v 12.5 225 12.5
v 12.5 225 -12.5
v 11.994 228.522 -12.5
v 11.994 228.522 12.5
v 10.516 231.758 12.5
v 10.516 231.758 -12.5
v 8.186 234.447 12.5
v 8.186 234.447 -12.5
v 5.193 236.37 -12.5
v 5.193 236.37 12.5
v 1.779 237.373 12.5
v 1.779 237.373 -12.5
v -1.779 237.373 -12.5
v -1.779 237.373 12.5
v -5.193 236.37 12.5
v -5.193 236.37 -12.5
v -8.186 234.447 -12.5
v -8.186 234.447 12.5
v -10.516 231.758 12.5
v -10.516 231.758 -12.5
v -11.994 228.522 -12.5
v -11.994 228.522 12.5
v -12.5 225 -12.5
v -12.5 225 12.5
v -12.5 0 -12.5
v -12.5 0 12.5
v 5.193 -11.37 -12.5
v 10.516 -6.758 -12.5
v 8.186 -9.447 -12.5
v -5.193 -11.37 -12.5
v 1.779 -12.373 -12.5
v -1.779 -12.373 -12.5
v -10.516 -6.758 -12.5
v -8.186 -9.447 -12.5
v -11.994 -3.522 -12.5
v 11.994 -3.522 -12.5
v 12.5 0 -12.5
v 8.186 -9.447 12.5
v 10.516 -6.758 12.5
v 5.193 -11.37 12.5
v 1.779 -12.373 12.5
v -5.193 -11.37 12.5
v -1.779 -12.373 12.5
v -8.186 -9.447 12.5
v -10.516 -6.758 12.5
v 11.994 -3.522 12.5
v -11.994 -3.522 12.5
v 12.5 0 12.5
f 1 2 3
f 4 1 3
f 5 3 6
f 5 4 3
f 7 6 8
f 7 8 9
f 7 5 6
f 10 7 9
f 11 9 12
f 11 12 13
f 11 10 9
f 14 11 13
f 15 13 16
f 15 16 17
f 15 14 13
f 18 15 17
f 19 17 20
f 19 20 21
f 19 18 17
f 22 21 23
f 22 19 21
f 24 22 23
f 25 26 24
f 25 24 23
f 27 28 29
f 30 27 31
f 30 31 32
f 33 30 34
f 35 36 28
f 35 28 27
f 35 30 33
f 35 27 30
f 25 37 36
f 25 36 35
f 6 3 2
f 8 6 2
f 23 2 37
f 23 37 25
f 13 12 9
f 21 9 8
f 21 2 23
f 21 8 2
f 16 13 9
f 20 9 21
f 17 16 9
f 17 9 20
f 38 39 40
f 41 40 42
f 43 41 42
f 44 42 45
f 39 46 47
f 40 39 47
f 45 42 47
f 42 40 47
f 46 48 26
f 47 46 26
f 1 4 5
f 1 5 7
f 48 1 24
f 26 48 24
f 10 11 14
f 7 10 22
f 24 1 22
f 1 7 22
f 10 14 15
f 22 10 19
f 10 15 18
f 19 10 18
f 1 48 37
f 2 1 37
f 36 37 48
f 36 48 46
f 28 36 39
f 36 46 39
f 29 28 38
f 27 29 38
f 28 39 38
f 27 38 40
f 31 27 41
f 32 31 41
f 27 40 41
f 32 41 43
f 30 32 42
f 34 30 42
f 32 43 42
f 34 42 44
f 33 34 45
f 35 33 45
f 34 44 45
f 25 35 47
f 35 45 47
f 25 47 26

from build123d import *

# Parameters (mm, degrees)
ESQUISSE1_W        = 25
ESQUISSE1_H        = 25
BOSS_EXTRU_1_DEPTH = 225
BOSS_EXTRU_2_DEPTH = 25
BOSS_EXTRU_3_DEPTH = 25


with BuildPart() as part:
    # Esquisse1 → Boss.-Extru.1 (new body)
    with BuildSketch(Plane(origin=(0, 0, 0), x_dir=(1, 0, 0), z_dir=(0, 1, 0))):
        Rectangle(ESQUISSE1_W, ESQUISSE1_H)
    extrude(amount=BOSS_EXTRU_1_DEPTH)

    # Esquisse2 → Boss.-Extru.2 (add)
    with BuildSketch(Plane.XY.offset(12.5)):
        with BuildLine():
            Line((-12.5, 225), (12.5, 225))
            ThreePointArc((12.5, 225), (0, 237.5), (-12.5, 225))
        make_face()
    extrude(amount=-BOSS_EXTRU_2_DEPTH)

    # Esquisse3 → Boss.-Extru.3 (add)
    with BuildSketch(Plane.XY.offset(12.5)):
        with BuildLine():
            Line((-12.5, 0), (12.5, 0))
            ThreePointArc((12.5, 0), (0, -12.5), (-12.5, 0))
        make_face()
    extrude(amount=-BOSS_EXTRU_3_DEPTH)


solid = part.part
